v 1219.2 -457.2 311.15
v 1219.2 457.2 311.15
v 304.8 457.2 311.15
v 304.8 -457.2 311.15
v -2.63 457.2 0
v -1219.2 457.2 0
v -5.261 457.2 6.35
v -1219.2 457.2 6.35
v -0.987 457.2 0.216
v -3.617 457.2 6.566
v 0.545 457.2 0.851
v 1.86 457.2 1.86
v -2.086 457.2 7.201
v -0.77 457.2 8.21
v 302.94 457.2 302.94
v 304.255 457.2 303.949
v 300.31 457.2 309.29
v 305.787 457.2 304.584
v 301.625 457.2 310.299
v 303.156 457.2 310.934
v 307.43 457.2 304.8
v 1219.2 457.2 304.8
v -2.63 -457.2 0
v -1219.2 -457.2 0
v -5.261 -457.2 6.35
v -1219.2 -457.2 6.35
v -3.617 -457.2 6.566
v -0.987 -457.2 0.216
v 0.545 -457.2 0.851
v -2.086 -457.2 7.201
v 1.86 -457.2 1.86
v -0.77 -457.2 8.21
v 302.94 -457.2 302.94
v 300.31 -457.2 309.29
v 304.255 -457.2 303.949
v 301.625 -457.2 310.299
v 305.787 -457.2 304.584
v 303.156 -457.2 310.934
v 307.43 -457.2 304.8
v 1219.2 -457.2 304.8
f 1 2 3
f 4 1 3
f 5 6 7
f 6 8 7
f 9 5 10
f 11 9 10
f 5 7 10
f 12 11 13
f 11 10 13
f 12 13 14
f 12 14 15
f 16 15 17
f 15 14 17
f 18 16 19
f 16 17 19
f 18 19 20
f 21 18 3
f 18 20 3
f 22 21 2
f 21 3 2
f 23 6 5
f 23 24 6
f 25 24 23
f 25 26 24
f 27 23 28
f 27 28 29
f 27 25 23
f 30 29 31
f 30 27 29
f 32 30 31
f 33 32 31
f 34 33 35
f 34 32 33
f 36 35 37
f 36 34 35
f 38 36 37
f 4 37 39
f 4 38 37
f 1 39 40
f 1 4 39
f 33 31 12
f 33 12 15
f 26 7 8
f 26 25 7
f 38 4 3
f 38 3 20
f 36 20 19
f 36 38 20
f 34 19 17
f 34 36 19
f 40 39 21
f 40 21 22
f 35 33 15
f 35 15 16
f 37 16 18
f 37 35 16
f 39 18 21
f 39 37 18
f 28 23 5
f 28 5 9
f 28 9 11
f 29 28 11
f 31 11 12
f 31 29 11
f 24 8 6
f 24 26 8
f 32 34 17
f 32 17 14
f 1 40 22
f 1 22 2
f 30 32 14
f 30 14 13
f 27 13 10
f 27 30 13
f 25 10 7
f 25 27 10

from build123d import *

# Parameters (mm, degrees)
F1_DEPTH = 457.2


with BuildPart() as f1:
    # F0 (on Front) → F1 (new body, symmetric)
    with BuildSketch(Plane.XZ):
        with BuildLine():
            Line((-1219.2, 0), (-2.630256, 0))
            ThreePointArc((-2.630256, 0), (-0.200216, 0.483365), (1.859872, 1.859872))
            Line((1.859872, 1.859872), (302.940128, 302.940128))
            ThreePointArc((302.940128, 302.940128), (305.000216, 304.316635), (307.430256, 304.8))
            Line((307.430256, 304.8), (1219.2, 304.8))
            Line((1219.2, 304.8), (1219.2, 311.15))
            Line((1219.2, 311.15), (304.8, 311.15))
            ThreePointArc((304.8, 311.15), (302.36996, 310.666635), (300.309872, 309.290128))
            Line((300.309872, 309.290128), (-0.770384, 8.209872))
            ThreePointArc((-0.770384, 8.209872), (-2.830472, 6.833365), (-5.260512, 6.35))
            Line((-5.260512, 6.35), (-1219.2, 6.35))
            Line((-1219.2, 6.35), (-1219.2, 0))
        make_face()
    extrude(amount=F1_DEPTH, both=True)


solid = f1.part
